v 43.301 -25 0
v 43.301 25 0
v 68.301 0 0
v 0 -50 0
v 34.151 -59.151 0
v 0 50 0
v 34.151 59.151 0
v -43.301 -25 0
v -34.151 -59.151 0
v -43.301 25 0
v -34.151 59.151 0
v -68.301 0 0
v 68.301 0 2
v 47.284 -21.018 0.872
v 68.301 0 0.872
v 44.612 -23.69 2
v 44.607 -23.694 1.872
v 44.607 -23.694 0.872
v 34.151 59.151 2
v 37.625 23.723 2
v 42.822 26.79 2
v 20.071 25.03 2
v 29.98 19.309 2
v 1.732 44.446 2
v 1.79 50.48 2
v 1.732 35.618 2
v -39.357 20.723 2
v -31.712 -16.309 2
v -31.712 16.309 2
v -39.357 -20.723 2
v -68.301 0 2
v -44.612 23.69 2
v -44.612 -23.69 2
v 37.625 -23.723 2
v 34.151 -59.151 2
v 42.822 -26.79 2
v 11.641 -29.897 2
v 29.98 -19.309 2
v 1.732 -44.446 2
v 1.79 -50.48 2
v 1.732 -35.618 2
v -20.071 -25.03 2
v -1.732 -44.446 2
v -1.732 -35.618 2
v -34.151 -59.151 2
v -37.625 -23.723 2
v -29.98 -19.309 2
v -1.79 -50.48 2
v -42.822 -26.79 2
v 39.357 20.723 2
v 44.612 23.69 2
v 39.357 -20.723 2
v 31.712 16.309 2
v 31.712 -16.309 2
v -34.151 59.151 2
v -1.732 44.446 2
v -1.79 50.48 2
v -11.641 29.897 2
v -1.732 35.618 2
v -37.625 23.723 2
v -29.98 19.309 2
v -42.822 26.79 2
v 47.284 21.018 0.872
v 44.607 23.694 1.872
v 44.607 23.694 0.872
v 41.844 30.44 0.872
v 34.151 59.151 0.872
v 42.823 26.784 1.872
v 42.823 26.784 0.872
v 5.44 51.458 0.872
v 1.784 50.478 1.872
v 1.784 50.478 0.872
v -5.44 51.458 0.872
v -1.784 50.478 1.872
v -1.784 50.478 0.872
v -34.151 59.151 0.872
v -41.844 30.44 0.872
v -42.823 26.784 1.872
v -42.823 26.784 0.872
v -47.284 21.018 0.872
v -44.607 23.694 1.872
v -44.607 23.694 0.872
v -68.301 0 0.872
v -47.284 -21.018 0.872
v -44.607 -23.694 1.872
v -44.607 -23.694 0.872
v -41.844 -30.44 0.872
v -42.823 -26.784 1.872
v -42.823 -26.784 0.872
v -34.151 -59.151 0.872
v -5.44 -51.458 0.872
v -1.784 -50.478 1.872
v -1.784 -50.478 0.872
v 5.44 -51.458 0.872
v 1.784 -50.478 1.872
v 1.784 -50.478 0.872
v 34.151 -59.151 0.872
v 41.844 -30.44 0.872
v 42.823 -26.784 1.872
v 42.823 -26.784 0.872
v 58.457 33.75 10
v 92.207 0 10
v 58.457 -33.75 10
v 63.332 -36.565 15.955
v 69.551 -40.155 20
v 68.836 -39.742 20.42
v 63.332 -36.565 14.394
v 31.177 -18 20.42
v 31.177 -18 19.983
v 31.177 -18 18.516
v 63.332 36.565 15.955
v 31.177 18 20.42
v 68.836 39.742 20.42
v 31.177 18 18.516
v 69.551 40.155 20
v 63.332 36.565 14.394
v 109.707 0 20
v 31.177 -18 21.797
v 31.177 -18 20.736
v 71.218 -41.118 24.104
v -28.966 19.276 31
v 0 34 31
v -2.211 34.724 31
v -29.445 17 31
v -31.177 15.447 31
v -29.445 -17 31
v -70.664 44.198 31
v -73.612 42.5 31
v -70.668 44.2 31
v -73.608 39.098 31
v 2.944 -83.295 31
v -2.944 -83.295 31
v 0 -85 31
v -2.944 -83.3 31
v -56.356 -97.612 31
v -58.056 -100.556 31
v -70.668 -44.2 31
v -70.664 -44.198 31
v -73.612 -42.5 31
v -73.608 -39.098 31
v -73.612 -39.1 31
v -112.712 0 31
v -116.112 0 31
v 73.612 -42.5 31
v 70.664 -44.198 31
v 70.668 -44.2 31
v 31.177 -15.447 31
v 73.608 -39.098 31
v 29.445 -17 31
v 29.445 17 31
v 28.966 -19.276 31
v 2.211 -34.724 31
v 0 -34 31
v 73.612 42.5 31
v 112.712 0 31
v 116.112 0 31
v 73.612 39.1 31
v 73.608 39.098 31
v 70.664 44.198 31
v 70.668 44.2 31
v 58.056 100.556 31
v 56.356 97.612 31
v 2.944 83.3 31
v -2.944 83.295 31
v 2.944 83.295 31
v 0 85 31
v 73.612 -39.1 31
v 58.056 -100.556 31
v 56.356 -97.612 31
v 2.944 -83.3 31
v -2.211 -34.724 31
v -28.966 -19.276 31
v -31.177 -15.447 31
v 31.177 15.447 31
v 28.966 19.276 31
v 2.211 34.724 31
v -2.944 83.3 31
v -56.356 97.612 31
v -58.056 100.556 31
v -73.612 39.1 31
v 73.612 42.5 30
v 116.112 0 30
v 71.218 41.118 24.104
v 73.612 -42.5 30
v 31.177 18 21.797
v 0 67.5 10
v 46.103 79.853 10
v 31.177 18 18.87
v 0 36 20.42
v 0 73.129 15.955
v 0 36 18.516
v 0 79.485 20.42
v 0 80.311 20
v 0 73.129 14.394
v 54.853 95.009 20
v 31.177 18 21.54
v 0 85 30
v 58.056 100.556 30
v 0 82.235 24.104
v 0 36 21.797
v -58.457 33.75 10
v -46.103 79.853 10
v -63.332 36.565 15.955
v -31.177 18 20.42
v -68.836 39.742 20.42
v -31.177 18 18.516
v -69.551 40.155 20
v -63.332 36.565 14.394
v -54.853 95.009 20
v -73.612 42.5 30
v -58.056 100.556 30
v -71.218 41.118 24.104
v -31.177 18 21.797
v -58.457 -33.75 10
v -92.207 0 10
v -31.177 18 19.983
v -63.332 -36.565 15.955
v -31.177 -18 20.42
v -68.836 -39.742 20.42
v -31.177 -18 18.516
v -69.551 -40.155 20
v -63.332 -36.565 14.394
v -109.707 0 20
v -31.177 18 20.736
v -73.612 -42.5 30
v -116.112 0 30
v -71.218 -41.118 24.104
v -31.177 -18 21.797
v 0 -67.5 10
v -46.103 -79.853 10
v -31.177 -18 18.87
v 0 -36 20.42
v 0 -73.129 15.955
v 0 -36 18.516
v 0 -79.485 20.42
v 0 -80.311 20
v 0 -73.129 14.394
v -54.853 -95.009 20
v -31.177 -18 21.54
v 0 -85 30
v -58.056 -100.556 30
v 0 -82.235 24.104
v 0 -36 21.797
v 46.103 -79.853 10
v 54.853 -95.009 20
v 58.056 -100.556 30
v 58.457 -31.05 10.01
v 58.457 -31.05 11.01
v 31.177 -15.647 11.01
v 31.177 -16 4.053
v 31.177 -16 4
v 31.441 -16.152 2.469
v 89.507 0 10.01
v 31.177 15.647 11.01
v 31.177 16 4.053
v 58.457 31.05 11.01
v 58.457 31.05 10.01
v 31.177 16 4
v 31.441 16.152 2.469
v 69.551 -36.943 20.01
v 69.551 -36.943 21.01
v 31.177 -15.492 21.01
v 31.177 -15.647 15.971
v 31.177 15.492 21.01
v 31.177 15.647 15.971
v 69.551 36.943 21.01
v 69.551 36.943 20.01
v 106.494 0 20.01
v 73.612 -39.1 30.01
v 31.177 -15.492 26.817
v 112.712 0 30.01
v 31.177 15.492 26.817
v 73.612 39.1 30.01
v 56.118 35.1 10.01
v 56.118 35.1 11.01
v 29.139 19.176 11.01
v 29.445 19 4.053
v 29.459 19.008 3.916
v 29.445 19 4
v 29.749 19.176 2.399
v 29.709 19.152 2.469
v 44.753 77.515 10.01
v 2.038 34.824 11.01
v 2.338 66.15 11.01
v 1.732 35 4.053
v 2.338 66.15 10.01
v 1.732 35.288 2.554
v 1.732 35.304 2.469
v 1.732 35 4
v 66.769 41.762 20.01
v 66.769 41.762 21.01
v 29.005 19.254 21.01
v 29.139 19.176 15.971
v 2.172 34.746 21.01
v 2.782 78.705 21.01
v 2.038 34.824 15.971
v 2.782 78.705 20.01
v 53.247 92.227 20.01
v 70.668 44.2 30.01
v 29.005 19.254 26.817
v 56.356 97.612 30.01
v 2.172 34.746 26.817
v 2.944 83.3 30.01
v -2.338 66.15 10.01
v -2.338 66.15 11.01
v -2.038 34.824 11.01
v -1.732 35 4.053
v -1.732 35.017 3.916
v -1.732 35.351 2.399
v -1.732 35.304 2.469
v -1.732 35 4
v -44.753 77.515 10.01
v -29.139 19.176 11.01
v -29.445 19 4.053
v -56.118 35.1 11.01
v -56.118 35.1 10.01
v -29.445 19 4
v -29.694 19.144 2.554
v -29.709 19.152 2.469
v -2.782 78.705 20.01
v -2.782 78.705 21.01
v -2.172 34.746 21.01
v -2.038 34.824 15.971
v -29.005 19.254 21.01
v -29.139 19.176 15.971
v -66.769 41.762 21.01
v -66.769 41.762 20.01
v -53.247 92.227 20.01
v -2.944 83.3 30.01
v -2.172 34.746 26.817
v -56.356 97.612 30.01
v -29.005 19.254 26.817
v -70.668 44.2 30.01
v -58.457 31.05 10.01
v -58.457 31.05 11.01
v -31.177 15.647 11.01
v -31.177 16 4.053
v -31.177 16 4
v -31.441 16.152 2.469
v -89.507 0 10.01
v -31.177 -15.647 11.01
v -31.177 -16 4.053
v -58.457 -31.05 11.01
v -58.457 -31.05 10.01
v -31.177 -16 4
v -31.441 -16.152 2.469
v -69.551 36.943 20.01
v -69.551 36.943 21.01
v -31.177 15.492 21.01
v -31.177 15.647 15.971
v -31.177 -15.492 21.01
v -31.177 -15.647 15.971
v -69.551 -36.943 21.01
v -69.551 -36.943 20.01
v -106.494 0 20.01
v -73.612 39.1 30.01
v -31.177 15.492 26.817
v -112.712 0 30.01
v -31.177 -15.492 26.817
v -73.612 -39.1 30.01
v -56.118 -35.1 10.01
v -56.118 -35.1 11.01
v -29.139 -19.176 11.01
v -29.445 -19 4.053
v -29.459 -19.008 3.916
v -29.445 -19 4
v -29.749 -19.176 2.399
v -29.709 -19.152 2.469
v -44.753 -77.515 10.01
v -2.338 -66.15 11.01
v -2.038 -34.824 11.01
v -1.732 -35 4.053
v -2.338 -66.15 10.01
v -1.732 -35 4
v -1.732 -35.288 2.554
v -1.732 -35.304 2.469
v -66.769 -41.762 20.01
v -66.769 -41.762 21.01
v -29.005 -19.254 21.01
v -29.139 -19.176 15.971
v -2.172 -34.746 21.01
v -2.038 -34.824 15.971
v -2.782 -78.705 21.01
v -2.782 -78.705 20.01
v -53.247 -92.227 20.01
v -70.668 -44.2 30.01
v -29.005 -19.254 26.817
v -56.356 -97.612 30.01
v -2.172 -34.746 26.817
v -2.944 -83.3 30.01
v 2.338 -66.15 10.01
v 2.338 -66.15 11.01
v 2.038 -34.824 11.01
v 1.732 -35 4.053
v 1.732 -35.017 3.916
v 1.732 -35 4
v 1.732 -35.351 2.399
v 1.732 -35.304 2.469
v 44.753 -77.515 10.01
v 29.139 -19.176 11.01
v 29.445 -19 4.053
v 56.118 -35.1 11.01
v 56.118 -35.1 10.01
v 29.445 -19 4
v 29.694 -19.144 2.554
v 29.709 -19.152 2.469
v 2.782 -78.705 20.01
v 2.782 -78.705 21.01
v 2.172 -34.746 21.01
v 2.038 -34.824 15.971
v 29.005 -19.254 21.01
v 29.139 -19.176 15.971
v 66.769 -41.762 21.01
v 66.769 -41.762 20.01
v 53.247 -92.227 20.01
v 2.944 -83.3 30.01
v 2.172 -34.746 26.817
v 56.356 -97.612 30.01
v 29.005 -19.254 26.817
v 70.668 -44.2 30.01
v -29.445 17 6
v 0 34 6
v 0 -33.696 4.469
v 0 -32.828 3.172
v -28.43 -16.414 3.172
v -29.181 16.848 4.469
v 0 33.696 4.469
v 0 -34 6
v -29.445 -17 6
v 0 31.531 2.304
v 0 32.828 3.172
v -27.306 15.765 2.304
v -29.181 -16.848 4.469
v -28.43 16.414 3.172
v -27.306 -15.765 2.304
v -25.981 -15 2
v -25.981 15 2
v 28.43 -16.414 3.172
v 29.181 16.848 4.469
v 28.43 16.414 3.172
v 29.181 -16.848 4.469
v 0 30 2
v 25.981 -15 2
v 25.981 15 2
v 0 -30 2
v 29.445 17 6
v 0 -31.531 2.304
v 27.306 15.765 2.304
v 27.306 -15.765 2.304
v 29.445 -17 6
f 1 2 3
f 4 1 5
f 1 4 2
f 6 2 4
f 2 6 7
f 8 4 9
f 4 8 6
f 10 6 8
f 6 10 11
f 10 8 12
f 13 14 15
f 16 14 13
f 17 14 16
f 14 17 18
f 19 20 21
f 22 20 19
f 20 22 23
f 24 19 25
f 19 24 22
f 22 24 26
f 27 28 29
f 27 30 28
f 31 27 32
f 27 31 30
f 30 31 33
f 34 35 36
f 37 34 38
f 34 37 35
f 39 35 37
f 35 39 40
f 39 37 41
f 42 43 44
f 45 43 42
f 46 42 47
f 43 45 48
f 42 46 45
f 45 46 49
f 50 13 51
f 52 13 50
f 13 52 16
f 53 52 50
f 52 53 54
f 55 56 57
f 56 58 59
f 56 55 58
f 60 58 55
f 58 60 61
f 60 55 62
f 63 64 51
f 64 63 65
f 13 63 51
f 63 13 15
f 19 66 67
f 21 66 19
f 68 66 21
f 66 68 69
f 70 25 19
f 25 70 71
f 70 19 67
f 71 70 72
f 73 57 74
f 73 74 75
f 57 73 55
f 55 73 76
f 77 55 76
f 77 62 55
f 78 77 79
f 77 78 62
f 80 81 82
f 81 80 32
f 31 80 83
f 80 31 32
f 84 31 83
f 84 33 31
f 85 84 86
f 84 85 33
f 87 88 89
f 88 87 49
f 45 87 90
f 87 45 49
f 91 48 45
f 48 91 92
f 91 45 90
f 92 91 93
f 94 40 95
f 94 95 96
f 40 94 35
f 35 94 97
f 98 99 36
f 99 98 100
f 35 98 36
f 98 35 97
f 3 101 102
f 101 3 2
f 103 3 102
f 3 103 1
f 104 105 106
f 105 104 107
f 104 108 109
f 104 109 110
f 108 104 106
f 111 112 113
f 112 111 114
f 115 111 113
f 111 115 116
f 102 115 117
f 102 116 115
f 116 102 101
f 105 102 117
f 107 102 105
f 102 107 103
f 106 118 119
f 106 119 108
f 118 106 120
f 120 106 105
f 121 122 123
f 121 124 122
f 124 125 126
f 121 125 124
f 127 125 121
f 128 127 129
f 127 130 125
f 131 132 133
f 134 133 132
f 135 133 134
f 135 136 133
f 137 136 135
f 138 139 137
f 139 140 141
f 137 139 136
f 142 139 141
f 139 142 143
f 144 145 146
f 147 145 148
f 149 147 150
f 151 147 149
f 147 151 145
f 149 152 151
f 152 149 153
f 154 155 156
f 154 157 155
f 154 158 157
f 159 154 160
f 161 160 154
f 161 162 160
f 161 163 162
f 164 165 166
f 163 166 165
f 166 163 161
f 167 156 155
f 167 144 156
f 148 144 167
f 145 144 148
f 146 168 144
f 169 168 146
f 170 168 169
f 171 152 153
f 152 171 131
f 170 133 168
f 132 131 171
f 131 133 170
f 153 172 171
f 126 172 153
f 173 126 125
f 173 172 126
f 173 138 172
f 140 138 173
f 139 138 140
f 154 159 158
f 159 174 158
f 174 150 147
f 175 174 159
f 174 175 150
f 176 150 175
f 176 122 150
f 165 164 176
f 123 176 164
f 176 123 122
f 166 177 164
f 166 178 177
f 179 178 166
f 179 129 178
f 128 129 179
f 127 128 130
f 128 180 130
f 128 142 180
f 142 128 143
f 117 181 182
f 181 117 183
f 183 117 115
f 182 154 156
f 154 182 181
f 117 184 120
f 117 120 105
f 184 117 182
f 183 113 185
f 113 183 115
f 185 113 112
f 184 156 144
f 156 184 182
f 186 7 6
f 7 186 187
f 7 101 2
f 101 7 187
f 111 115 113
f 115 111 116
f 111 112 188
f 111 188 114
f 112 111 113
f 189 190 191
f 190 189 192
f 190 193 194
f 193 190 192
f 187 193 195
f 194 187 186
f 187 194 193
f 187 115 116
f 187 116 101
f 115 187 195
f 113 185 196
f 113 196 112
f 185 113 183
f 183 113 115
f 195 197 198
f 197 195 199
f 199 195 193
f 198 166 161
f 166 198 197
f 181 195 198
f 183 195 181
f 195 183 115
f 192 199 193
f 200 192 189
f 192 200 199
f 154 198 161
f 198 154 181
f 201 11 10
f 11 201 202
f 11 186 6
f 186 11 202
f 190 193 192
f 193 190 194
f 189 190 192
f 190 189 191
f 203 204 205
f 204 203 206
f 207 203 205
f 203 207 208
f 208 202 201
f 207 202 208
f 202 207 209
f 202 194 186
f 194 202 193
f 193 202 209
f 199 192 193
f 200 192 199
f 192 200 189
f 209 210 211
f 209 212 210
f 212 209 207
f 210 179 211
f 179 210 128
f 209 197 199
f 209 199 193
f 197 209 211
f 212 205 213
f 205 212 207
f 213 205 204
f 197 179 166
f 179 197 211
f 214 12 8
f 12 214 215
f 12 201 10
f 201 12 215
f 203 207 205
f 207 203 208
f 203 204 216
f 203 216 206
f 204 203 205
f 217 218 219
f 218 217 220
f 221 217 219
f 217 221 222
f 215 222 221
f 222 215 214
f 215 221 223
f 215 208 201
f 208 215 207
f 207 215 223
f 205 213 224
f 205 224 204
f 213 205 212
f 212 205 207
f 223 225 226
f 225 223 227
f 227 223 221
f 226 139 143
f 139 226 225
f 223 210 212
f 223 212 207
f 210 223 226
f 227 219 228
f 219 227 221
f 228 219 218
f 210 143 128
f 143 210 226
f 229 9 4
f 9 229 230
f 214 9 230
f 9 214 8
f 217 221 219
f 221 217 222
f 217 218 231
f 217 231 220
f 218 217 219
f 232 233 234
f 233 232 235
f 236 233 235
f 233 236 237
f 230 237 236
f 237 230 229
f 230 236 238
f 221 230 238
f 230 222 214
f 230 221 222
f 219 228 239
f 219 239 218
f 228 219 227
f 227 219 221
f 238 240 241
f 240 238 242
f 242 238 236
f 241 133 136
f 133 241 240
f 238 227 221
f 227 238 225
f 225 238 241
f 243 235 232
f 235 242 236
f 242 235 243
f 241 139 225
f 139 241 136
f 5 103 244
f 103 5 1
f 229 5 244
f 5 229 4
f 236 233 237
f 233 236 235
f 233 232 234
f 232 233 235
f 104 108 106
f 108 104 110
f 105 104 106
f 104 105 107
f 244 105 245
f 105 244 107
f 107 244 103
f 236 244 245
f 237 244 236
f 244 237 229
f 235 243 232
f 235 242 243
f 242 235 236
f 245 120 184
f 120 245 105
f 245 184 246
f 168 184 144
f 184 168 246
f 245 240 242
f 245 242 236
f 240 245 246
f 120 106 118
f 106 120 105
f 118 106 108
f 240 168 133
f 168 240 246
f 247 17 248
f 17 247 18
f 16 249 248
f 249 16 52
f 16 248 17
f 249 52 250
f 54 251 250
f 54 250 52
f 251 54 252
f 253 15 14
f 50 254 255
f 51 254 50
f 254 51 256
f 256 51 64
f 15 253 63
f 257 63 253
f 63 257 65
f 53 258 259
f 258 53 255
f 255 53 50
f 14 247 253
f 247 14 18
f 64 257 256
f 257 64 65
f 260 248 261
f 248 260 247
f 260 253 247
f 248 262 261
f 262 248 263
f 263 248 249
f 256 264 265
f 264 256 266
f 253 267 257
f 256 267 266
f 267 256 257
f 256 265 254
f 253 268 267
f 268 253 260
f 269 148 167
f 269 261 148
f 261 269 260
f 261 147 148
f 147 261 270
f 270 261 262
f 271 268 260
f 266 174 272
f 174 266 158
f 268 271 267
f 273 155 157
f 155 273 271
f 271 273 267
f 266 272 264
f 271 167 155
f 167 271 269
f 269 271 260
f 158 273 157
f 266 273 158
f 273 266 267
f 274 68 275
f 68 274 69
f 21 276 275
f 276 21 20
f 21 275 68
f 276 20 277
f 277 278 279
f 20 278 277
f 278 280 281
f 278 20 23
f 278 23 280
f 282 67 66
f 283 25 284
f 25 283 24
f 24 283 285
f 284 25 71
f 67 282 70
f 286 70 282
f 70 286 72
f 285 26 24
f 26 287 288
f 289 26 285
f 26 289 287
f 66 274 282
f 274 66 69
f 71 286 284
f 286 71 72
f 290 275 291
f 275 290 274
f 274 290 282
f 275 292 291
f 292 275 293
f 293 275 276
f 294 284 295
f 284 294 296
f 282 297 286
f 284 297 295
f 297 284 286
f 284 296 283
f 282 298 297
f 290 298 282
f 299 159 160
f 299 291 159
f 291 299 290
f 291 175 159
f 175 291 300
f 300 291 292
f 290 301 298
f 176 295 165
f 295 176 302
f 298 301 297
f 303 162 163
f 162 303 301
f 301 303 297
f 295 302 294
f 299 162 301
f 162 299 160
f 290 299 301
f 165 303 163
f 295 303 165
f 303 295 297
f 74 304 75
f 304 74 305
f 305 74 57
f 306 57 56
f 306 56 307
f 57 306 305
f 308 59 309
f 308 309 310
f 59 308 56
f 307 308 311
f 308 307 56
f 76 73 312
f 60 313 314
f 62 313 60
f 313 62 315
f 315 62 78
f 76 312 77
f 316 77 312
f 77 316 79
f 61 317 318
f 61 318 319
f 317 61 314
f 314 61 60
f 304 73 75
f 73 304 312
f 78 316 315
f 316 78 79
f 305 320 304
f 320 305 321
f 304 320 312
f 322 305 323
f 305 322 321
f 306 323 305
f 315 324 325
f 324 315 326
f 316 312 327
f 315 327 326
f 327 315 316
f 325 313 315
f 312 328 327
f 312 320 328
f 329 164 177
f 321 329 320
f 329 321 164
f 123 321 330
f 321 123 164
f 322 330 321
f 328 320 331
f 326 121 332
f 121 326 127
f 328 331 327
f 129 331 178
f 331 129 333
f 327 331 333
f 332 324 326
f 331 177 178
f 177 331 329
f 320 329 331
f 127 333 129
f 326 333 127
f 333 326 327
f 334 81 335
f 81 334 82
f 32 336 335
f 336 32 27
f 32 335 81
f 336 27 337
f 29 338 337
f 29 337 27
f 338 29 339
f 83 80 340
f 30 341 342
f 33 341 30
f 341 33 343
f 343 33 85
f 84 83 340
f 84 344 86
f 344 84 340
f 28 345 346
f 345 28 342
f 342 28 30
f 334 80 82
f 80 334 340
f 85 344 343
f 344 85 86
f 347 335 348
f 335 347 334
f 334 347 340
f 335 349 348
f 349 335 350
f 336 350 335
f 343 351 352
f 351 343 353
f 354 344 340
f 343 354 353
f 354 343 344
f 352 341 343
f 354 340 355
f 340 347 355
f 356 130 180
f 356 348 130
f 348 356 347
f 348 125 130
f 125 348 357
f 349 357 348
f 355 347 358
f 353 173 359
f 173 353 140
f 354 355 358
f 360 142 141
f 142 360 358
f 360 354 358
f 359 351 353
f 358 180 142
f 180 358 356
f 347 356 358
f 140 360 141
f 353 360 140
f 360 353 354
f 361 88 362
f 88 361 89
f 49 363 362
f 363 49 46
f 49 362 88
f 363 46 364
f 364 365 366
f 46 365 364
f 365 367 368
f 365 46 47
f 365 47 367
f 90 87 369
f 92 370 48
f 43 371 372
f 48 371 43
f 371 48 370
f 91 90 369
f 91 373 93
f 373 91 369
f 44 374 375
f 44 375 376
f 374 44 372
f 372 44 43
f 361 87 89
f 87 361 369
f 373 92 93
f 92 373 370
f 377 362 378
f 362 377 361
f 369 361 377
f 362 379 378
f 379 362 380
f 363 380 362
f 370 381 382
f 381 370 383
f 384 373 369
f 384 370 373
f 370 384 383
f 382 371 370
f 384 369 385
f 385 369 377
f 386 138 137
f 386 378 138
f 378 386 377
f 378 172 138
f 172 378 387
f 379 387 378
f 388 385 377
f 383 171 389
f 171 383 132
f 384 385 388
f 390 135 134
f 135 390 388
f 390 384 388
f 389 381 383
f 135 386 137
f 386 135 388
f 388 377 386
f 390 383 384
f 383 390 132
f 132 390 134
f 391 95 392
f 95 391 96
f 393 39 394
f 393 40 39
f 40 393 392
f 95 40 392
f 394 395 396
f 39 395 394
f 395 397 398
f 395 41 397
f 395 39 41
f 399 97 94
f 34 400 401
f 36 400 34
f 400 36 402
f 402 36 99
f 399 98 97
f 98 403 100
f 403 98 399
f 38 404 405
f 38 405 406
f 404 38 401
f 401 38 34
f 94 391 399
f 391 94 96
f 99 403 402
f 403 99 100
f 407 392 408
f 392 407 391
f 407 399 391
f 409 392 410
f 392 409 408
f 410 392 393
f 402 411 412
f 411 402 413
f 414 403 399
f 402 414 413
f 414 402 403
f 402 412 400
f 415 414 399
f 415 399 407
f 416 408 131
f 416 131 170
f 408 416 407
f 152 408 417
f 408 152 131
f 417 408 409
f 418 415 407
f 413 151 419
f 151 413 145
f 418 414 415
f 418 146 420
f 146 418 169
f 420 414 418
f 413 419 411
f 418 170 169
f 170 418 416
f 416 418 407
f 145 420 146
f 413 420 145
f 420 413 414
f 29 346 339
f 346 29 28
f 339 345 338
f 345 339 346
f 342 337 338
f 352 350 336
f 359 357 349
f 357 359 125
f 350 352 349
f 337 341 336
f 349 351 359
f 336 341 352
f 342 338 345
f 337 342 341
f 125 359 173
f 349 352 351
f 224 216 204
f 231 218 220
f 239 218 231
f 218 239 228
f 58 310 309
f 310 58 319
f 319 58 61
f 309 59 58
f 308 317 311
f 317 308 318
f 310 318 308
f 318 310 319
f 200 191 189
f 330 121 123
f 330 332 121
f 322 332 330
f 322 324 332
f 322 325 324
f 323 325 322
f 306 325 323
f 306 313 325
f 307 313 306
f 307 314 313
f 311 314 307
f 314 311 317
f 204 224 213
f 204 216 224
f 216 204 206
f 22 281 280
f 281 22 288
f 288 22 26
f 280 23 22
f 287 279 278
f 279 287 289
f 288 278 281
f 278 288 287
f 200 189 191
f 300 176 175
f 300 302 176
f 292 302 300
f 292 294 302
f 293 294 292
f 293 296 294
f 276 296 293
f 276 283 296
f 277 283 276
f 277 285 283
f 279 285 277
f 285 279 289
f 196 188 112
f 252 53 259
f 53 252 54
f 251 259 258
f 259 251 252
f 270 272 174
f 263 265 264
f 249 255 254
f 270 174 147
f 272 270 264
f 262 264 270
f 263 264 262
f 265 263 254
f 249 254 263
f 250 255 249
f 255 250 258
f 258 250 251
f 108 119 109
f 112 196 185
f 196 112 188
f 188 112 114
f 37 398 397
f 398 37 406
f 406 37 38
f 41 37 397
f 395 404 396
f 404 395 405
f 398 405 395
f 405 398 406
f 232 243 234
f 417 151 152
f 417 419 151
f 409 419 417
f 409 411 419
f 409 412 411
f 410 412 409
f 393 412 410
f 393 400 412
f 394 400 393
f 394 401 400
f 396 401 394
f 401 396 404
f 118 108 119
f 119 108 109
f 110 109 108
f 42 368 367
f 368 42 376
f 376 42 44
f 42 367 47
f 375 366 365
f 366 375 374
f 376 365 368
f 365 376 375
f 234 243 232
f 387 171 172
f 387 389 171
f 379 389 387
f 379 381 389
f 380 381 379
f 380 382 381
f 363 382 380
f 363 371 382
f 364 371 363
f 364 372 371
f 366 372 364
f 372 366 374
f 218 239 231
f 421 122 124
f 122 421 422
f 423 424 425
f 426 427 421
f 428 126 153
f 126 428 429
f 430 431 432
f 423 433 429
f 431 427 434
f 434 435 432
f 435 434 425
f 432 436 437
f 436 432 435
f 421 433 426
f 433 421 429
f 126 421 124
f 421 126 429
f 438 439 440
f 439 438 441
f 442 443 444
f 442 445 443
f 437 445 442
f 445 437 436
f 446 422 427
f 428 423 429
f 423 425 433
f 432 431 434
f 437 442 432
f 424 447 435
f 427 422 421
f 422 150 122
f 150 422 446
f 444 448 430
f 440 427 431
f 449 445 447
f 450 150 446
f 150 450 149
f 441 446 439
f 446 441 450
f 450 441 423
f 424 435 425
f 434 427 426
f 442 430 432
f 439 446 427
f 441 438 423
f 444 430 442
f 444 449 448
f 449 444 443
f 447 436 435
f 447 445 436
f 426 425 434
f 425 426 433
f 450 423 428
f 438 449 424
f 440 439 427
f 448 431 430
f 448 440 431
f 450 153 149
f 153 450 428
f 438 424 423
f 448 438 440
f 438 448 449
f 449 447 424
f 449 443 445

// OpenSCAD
/*
All code by Patrick Gaston, June 2021. Use at your own risk. Credit where due.
*/

/* [Outer Shape] */
// Number of cups around the center
count_sides = 6;  // [2:1:10]

// Height of bowls
height_wall = 30; // [10:1:60]

// Vertical resolution of curve from bottom to top of bowls
count_height_subdivisions = 3; // [1:1:16]

// How much walls curve outward from base. 0 = vertical walls.
amplitude_height_divisions = .7; // [0:0.1:1.5]

// Radius of base inner vertices. Defines overall diameter of model.
radius_outer = 50; // [10:1:100]

thickness_wall = 2*1; //Approximate. Fiddle with it to get what you want.

// How far each cup curves outward
amplitude_petals = 1; // [0:0.1:2]

// Resolution of curved side of cup
count_petal_subdivisions = 2; // [1:1:24]

/* [Center Cup] */
// Radius of central cup. Set to 0 for no cup.
radius_cup = 34;  // [0:2:80]

// Number of sides of central cup. Looks best if matches number of outer cups.
count_sides_cup = 6; // [3:1:24]

// Size of outer curved base of central cup.
radius_bevel_cup_outer = 4; // [0:2:30]

// Size of inner curved base of central cup
radius_bevel_cup_inner = 4; // [0:2:30]

// Smoothness of central cup base curves.
count_bevel_divisions = 16;  // [1:1:24]

theta = 360/count_sides;
A = radius_outer * cos(theta/2);
B = radius_outer * sin(theta/2);
C = thickness_wall;
D = C / tan(theta/2); //How far to inset the center point of main dish hollow.
epsilon = 0.01 * 1;

color(Random_Color())
difference()
    {
     union()
        {
         base();
         main_dish();
         center_cup_positive();
        }
     center_cup_negative();
    }
module base()
{
 for (j = [0:count_sides - 1])
    {
     rotate([0,0,j*360/count_sides])
        {
         coords0 = [[0,0], for (i = [0:count_petal_subdivisions]) [(A + B * amplitude_petals * cos(270+(i*180/count_petal_subdivisions))), (B * sin(270+(i*180/count_petal_subdivisions)))]];
         linear_extrude(height = thickness_wall)
            polygon(coords0);
       }
    }
}
module main_dish()
{
 difference()
    {
     for (j = [0:count_sides - 1])
        {
         rotate([0,0,j*360/count_sides])
         for (k = [0:count_height_subdivisions - 1])
            {
             coords0 = [[0,0],
               for (i = [0:count_petal_subdivisions])
                   [(A + B * amplitude_petals * cos(270+(i*180/count_petal_subdivisions))) * (1 + amplitude_height_divisions * (cos(270 + ((k) * 90/count_height_subdivisions)))),
                    (B * sin(270+(i*180/count_petal_subdivisions))) * (1 + amplitude_height_divisions * (cos(270 + ((k) * 90/count_height_subdivisions))))]];
             coords1 = [[0,0],
               for (i = [0:count_petal_subdivisions])
                   [(A + B * amplitude_petals * cos(270+(i*180/count_petal_subdivisions))) * (1 + amplitude_height_divisions * (cos(270 + ((k+1) * 90/count_height_subdivisions)))),
                    (B * sin(270+(i*180/count_petal_subdivisions))) * (1 + amplitude_height_divisions * (cos(270 + ((k+1) * 90/count_height_subdivisions))))]];
             hull()
                {
                 translate([0,0, k*height_wall/count_height_subdivisions])
                 linear_extrude(height = thickness_wall)
                    polygon(coords0);
                 translate([0,0, (k+1)*height_wall/count_height_subdivisions])                
                 linear_extrude(height = 1)
                    polygon(coords1);
                }
            }
        }
     //Negative spaces
     translate([0,0,epsilon])   
     for (j = [0:count_sides - 1])
        {
         rotate([0,0,j*360/count_sides])
         for (k = [0:count_height_subdivisions - 1])
            {
             //Bottom of current hull   
             coords0 = [[D,0],
               for (i = [0:count_petal_subdivisions])
                   [(A + (B-thickness_wall) * amplitude_petals * cos(270+(i*180/count_petal_subdivisions))) * (1 + amplitude_height_divisions * (cos(270 + ((k) * 90/count_height_subdivisions)))),
                    ((B-thickness_wall) * sin(270+(i*180/count_petal_subdivisions))) * (1 + amplitude_height_divisions * (cos(270 + ((k) * 90/count_height_subdivisions))))]];
             //Top of current hull
             coords1 = [[D,0],
               for (i = [0:count_petal_subdivisions])
                   [(A + (B-thickness_wall) * amplitude_petals * cos(270+(i*180/count_petal_subdivisions))) * (1 + amplitude_height_divisions * (cos(270 + ((k+1) * 90/count_height_subdivisions)))),
                    ((B-thickness_wall) * sin(270+(i*180/count_petal_subdivisions))) * (1 + amplitude_height_divisions * (cos(270 + ((k+1) * 90/count_height_subdivisions))))]];
             hull()
                {
                 translate([0,0, k*height_wall/count_height_subdivisions])
                 linear_extrude(height = 1)
                    polygon(coords0);
                 translate([0,0, (k+1)*height_wall/count_height_subdivisions])                
                 linear_extrude(height = 1)
                    polygon(coords1);
                }
            }
        }
    }
}
module center_cup_positive()
{
 rotate([0,0,180/count_sides_cup]) //REM this line to align cup differently
 //translate([0,0,thickness_wall])
 rotate_extrude($fn = count_sides_cup)
     {
     square([radius_cup + thickness_wall,height_wall + 1]);
     difference()
        {
         translate([radius_cup + thickness_wall,0,0])
            square([radius_bevel_cup_outer,radius_bevel_cup_outer]);
         translate([radius_cup + thickness_wall + radius_bevel_cup_outer,radius_bevel_cup_outer,0])
            circle(r = radius_bevel_cup_outer, $fn = count_bevel_divisions);
        }
    }
}
module center_cup_negative()
{
 rotate([0,0,180/count_sides_cup])   //REM this line to align cup differently 
 translate([0,0,thickness_wall])
 rotate_extrude($fn = count_sides_cup)
    {
     difference()
        {
         square([radius_cup,height_wall]);
         difference()
            {
             translate([radius_cup-radius_bevel_cup_inner,0,0])
                square([radius_bevel_cup_inner,radius_bevel_cup_inner]);
             translate([radius_cup-radius_bevel_cup_inner,radius_bevel_cup_inner,0])
                circle(r = radius_bevel_cup_inner, $fn = count_bevel_divisions);
            }
        }    
    }
}
function Random_Color() = [rands(0.5,1,1)[0], rands(0.5,1,1)[0], rands(0.5,1,1)[0]];
